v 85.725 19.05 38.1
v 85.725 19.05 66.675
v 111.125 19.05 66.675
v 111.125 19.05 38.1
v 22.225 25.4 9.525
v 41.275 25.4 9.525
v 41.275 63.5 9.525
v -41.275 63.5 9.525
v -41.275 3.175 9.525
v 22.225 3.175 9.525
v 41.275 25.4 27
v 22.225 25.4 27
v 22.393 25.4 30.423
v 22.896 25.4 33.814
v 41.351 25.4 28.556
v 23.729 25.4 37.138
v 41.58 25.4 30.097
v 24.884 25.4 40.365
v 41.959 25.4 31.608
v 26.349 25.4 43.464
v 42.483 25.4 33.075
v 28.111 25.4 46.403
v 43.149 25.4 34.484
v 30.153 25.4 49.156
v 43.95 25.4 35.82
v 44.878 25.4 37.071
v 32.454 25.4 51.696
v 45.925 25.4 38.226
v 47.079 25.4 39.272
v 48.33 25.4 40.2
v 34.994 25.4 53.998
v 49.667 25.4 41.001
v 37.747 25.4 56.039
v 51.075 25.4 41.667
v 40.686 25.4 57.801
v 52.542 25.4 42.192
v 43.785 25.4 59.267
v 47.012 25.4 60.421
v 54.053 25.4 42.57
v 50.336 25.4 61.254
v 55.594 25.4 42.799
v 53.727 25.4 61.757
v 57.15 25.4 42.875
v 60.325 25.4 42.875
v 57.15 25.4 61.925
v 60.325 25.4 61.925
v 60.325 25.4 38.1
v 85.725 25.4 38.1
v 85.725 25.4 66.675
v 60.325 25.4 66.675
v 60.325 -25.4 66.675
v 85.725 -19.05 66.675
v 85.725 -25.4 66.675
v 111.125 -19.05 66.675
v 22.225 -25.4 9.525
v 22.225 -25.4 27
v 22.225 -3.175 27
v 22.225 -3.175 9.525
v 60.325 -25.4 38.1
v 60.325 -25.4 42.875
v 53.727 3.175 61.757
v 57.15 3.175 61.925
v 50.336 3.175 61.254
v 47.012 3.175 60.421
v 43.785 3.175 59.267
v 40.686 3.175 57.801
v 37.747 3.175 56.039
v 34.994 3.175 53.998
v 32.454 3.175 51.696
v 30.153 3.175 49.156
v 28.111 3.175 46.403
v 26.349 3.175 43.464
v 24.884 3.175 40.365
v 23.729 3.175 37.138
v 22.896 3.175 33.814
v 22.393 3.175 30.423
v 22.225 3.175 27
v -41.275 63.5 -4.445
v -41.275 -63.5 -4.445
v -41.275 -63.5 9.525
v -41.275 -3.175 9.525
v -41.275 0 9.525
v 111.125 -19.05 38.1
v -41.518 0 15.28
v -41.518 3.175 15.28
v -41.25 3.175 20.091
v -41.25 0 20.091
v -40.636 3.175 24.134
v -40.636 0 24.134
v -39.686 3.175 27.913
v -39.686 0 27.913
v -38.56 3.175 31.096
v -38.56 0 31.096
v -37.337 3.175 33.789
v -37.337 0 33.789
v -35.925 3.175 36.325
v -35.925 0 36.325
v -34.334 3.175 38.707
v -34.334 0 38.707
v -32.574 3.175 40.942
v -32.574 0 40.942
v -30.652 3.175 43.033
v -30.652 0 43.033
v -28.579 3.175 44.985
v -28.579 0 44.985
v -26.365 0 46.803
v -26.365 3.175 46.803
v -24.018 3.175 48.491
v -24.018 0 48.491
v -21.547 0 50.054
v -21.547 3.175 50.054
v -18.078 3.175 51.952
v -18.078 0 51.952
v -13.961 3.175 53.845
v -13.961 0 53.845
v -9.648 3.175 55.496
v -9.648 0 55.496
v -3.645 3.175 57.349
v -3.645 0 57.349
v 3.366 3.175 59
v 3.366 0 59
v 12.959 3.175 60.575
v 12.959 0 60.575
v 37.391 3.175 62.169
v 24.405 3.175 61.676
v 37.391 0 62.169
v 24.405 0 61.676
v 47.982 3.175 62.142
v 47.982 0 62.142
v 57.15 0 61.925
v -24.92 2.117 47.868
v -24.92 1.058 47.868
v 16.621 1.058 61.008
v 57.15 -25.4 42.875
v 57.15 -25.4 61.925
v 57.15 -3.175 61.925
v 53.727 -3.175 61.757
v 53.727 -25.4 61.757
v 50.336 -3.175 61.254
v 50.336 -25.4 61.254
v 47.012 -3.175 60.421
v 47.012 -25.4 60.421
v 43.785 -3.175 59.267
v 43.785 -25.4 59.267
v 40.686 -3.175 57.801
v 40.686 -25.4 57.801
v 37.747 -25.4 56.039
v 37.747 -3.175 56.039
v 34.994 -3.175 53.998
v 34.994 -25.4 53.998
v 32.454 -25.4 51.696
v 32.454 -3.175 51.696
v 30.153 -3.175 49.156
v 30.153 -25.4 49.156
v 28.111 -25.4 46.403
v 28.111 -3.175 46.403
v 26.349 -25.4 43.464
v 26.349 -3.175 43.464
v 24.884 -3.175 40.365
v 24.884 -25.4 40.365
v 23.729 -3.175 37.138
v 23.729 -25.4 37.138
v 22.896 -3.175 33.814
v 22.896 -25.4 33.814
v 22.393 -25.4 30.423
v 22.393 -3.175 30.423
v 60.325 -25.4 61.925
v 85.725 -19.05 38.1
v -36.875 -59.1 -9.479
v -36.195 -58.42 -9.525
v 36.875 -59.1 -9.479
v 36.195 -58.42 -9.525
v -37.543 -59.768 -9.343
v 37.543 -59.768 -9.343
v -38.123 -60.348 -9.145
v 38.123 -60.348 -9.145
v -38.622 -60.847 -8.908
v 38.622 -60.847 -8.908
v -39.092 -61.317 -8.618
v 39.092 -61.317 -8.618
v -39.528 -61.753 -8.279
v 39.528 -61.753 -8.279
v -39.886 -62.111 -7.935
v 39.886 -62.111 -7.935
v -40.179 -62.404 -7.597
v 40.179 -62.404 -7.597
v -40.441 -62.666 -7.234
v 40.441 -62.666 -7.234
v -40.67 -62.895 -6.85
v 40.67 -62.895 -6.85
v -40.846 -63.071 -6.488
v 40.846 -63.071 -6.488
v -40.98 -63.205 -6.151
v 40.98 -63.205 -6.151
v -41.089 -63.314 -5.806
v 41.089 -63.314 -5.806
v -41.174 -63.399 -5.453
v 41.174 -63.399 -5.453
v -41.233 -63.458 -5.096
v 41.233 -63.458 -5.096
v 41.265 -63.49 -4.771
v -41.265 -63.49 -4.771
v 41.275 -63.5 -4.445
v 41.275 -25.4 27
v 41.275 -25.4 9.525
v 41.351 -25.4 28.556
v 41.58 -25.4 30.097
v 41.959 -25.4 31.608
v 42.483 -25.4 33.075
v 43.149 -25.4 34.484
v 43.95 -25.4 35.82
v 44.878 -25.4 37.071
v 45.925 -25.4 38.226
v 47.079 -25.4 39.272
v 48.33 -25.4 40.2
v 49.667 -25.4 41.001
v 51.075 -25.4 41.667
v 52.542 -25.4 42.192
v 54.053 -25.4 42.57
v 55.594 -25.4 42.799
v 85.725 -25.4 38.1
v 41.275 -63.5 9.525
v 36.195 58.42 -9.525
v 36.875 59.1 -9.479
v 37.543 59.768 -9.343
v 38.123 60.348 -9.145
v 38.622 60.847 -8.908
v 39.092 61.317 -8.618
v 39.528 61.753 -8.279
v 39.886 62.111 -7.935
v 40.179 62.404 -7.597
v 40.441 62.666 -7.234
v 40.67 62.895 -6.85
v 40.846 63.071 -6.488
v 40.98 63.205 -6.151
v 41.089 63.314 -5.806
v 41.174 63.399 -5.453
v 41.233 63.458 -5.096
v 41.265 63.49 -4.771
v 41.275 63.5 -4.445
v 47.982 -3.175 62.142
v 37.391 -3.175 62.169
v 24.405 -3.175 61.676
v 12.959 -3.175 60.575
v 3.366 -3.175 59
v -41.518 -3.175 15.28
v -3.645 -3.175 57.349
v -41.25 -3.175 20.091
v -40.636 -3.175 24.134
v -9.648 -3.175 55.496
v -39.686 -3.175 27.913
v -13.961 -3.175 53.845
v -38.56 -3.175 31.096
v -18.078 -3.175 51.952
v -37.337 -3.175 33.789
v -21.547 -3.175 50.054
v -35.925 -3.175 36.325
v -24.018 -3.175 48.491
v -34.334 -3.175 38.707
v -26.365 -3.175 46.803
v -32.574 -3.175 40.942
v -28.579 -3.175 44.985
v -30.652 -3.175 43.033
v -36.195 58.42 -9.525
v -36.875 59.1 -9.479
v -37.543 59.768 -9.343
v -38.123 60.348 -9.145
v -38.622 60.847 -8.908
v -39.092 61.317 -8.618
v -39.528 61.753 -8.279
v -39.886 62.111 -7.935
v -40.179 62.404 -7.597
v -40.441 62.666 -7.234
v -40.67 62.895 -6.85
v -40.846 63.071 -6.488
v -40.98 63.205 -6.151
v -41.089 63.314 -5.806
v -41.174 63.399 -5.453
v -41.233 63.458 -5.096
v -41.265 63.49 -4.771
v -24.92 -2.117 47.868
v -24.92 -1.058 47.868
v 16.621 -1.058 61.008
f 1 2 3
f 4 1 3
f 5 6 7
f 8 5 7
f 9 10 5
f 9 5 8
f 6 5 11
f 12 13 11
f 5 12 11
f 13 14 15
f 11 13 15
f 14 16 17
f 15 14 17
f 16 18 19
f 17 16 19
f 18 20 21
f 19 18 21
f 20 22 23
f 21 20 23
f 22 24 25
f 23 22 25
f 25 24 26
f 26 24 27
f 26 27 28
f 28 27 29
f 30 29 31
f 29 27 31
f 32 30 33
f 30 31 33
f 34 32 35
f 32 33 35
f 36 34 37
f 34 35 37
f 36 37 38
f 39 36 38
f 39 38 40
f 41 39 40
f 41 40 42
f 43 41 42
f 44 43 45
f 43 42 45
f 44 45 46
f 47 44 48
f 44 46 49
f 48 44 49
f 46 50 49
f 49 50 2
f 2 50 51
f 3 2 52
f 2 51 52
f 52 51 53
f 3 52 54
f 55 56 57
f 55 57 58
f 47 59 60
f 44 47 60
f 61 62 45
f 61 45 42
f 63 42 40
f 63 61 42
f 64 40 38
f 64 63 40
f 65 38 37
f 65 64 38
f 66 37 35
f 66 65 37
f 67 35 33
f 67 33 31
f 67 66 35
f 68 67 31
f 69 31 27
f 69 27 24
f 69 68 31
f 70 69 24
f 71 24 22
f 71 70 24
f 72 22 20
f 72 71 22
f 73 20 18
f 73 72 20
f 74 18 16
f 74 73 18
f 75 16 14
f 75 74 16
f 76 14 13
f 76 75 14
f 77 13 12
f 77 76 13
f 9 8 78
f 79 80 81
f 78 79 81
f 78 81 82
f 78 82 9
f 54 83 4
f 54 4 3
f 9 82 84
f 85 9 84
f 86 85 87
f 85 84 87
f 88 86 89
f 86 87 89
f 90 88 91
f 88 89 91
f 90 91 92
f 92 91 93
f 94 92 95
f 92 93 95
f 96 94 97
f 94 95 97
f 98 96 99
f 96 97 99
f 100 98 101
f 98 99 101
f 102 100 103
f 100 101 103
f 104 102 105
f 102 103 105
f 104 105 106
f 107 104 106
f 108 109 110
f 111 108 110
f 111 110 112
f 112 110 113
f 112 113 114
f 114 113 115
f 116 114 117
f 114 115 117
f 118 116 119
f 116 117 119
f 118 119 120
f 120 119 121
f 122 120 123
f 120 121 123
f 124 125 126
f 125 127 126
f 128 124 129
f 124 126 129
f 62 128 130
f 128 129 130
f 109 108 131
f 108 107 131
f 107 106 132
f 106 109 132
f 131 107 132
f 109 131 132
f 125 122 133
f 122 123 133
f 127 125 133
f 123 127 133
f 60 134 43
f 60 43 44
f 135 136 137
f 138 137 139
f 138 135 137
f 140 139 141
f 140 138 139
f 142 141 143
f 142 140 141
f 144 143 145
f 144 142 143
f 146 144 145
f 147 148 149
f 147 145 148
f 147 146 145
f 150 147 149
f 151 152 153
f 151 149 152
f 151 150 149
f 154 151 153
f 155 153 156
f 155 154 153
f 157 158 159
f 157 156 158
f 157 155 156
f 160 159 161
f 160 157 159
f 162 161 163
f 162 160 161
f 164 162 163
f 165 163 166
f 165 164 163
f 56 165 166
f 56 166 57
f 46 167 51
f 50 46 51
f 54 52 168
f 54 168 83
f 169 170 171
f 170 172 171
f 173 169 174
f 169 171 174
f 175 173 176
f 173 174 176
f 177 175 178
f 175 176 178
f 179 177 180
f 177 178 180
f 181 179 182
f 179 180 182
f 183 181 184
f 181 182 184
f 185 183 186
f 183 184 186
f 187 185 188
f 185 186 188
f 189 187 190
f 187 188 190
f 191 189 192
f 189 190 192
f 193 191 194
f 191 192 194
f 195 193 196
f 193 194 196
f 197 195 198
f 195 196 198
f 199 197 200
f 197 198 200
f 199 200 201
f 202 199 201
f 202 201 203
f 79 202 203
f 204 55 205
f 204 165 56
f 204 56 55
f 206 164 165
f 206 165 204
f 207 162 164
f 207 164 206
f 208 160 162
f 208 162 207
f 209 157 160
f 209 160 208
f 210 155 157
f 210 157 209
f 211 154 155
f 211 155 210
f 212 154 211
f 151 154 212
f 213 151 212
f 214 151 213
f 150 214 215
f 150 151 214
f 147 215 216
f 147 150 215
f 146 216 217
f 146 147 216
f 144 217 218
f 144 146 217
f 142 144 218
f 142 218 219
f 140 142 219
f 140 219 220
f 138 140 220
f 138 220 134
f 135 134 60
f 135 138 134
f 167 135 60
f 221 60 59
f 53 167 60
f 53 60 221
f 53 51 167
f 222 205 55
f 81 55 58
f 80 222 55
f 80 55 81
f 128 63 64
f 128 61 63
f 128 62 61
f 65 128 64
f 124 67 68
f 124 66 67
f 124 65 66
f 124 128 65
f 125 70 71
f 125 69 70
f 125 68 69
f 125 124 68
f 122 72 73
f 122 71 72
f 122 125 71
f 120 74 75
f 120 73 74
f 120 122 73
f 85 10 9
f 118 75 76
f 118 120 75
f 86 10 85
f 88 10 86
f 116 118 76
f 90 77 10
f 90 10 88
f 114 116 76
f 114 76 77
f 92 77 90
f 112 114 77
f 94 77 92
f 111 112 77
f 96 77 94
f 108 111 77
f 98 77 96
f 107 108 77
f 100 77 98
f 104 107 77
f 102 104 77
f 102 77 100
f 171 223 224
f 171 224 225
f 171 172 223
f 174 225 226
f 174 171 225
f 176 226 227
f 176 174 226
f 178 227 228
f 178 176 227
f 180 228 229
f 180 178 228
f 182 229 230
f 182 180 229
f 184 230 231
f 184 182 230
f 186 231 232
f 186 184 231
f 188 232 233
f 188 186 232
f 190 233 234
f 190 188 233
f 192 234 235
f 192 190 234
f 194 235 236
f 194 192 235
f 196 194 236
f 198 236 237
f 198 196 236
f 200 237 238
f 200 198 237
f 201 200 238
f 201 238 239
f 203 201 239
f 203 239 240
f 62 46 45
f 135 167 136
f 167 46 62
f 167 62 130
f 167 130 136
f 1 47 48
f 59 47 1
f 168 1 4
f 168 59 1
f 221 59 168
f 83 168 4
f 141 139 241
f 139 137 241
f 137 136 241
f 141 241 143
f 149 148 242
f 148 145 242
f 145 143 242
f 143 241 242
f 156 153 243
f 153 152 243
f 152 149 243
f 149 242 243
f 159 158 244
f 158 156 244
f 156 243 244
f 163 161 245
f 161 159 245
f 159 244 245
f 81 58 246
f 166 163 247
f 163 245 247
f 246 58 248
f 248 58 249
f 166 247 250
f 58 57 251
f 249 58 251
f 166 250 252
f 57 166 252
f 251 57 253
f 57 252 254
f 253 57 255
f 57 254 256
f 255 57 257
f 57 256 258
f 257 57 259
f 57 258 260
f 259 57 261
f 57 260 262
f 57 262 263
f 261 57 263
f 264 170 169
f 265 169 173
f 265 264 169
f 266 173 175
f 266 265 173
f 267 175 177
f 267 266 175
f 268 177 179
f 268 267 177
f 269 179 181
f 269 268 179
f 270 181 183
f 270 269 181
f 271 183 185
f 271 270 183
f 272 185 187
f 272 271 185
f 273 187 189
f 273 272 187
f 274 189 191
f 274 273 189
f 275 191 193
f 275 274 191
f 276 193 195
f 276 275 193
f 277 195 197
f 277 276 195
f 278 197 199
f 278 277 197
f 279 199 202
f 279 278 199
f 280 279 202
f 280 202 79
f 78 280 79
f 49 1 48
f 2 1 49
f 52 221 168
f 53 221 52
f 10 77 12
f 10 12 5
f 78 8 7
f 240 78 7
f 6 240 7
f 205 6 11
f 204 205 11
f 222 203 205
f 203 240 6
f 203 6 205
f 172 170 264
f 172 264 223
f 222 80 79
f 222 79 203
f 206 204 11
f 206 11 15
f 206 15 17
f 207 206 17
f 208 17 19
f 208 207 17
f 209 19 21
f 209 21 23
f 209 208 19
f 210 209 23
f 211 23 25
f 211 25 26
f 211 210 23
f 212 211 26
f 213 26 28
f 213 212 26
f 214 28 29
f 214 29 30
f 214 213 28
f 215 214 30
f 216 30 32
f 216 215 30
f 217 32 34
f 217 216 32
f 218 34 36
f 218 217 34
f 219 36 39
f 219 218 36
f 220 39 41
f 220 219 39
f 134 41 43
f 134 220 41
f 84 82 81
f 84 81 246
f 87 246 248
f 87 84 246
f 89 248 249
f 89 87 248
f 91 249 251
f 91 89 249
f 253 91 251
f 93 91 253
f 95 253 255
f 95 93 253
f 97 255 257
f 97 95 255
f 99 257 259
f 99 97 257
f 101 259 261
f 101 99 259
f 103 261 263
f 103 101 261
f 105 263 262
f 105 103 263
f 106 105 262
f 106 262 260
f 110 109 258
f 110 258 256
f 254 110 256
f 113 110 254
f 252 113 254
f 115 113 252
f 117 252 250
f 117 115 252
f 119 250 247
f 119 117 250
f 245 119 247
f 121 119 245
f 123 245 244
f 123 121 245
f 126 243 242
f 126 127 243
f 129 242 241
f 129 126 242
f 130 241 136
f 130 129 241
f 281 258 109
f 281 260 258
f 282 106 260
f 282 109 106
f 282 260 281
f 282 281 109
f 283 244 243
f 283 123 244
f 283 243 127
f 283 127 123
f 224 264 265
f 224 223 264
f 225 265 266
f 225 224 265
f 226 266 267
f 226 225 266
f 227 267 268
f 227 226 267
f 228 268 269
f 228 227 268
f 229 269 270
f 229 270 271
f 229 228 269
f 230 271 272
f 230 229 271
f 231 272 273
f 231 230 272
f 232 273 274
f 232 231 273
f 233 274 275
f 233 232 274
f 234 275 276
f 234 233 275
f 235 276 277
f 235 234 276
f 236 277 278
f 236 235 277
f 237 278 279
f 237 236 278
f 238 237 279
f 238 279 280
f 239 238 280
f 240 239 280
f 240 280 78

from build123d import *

# Parameters (mm, degrees)
F1_DEPTH = 63.5
F0_W     = 25.4
F0_H     = 19.05
F0_H_2   = 4.7498
F0_H_3   = 4.7752
F2_DEPTH = 25.4
F3_DEPTH = 3.175
F4_R     = 5.08
F5_DEPTH = 19.05


with BuildPart() as f1:
    # F0 (on Front) → F1 (new body, symmetric)
    with BuildSketch(Plane.XZ):
        Polygon((-41.275, -9.525), (41.275, -9.525), (41.275, 9.525), (22.225, 9.525), (-41.275, 9.525), align=None)
    extrude(amount=F1_DEPTH, both=True)

    # F0 (on Front) → F2 (join, symmetric)
    with BuildSketch(Plane.XZ):
        with BuildLine():
            Line((22.225, 9.525), (41.275, 9.525))
            Line((41.275, 9.525), (41.275, 27.0002))
            ThreePointArc((41.275, 27.0002), (45.9246798487, 38.2255201513), (57.15, 42.8752))
            Line((57.15, 42.8752), (60.325, 42.8752))
            Line((60.325, 42.8752), (60.325, 61.9252))
            Line((60.325, 61.9252), (57.15, 61.9252))
            ThreePointArc((57.15, 61.9252), (32.4542956671, 51.6959043329), (22.225, 27.0002))
            Line((22.225, 27.0002), (22.225, 9.525))
        make_face()
        with Locations((73.025, 52.4002)):
            Rectangle(F0_W, F0_H)
        with Locations((73.025, 64.3001)):
            Rectangle(F0_W, F0_H_2)
        with Locations((73.025, 40.4876)):
            Rectangle(F0_W, F0_H_3)
    extrude(amount=F2_DEPTH, both=True)

    # F0 (on Front) → F3 (join, symmetric)
    with BuildSketch(Plane.XZ):
        with BuildLine():
            add(Edge.make_bspline(
                [(-41.275, 9.525), (-46.2452806532, 64.7963359952), (25.8592385799, 62.7934262156), (57.15, 61.9252)],
                knots=[0, 0, 0, 0, 111.5045361635, 111.5045361635, 111.5045361635, 111.5045361635], degree=3))
            Line((-41.275, 9.525), (22.225, 9.525))
            Line((22.225, 9.525), (22.225, 27.0002))
            ThreePointArc((22.225, 27.0002), (32.4542956671, 51.6959043329), (57.15, 61.9252))
        make_face()
    extrude(amount=F3_DEPTH, both=True)

    # F4
    f4_edges = [f1.edges().sort_by_distance(p)[0] for p in [
        (0, -63.5, -9.525),
        (41.275, 0, -9.525),
        (0, 63.5, -9.525),
        (-41.275, 0, -9.525),
    ]]
    fillet(f4_edges, radius=F4_R)

    # F0 (on Front) → F5 (join, symmetric)
    with BuildSketch(Plane.XZ):
        Polygon((85.725, 66.675), (85.725, 61.9252), (85.725, 42.8752), (85.725, 38.1), (111.125, 38.1), (111.125, 66.675), align=None)
    extrude(amount=F5_DEPTH, both=True)


solid = f1.part
